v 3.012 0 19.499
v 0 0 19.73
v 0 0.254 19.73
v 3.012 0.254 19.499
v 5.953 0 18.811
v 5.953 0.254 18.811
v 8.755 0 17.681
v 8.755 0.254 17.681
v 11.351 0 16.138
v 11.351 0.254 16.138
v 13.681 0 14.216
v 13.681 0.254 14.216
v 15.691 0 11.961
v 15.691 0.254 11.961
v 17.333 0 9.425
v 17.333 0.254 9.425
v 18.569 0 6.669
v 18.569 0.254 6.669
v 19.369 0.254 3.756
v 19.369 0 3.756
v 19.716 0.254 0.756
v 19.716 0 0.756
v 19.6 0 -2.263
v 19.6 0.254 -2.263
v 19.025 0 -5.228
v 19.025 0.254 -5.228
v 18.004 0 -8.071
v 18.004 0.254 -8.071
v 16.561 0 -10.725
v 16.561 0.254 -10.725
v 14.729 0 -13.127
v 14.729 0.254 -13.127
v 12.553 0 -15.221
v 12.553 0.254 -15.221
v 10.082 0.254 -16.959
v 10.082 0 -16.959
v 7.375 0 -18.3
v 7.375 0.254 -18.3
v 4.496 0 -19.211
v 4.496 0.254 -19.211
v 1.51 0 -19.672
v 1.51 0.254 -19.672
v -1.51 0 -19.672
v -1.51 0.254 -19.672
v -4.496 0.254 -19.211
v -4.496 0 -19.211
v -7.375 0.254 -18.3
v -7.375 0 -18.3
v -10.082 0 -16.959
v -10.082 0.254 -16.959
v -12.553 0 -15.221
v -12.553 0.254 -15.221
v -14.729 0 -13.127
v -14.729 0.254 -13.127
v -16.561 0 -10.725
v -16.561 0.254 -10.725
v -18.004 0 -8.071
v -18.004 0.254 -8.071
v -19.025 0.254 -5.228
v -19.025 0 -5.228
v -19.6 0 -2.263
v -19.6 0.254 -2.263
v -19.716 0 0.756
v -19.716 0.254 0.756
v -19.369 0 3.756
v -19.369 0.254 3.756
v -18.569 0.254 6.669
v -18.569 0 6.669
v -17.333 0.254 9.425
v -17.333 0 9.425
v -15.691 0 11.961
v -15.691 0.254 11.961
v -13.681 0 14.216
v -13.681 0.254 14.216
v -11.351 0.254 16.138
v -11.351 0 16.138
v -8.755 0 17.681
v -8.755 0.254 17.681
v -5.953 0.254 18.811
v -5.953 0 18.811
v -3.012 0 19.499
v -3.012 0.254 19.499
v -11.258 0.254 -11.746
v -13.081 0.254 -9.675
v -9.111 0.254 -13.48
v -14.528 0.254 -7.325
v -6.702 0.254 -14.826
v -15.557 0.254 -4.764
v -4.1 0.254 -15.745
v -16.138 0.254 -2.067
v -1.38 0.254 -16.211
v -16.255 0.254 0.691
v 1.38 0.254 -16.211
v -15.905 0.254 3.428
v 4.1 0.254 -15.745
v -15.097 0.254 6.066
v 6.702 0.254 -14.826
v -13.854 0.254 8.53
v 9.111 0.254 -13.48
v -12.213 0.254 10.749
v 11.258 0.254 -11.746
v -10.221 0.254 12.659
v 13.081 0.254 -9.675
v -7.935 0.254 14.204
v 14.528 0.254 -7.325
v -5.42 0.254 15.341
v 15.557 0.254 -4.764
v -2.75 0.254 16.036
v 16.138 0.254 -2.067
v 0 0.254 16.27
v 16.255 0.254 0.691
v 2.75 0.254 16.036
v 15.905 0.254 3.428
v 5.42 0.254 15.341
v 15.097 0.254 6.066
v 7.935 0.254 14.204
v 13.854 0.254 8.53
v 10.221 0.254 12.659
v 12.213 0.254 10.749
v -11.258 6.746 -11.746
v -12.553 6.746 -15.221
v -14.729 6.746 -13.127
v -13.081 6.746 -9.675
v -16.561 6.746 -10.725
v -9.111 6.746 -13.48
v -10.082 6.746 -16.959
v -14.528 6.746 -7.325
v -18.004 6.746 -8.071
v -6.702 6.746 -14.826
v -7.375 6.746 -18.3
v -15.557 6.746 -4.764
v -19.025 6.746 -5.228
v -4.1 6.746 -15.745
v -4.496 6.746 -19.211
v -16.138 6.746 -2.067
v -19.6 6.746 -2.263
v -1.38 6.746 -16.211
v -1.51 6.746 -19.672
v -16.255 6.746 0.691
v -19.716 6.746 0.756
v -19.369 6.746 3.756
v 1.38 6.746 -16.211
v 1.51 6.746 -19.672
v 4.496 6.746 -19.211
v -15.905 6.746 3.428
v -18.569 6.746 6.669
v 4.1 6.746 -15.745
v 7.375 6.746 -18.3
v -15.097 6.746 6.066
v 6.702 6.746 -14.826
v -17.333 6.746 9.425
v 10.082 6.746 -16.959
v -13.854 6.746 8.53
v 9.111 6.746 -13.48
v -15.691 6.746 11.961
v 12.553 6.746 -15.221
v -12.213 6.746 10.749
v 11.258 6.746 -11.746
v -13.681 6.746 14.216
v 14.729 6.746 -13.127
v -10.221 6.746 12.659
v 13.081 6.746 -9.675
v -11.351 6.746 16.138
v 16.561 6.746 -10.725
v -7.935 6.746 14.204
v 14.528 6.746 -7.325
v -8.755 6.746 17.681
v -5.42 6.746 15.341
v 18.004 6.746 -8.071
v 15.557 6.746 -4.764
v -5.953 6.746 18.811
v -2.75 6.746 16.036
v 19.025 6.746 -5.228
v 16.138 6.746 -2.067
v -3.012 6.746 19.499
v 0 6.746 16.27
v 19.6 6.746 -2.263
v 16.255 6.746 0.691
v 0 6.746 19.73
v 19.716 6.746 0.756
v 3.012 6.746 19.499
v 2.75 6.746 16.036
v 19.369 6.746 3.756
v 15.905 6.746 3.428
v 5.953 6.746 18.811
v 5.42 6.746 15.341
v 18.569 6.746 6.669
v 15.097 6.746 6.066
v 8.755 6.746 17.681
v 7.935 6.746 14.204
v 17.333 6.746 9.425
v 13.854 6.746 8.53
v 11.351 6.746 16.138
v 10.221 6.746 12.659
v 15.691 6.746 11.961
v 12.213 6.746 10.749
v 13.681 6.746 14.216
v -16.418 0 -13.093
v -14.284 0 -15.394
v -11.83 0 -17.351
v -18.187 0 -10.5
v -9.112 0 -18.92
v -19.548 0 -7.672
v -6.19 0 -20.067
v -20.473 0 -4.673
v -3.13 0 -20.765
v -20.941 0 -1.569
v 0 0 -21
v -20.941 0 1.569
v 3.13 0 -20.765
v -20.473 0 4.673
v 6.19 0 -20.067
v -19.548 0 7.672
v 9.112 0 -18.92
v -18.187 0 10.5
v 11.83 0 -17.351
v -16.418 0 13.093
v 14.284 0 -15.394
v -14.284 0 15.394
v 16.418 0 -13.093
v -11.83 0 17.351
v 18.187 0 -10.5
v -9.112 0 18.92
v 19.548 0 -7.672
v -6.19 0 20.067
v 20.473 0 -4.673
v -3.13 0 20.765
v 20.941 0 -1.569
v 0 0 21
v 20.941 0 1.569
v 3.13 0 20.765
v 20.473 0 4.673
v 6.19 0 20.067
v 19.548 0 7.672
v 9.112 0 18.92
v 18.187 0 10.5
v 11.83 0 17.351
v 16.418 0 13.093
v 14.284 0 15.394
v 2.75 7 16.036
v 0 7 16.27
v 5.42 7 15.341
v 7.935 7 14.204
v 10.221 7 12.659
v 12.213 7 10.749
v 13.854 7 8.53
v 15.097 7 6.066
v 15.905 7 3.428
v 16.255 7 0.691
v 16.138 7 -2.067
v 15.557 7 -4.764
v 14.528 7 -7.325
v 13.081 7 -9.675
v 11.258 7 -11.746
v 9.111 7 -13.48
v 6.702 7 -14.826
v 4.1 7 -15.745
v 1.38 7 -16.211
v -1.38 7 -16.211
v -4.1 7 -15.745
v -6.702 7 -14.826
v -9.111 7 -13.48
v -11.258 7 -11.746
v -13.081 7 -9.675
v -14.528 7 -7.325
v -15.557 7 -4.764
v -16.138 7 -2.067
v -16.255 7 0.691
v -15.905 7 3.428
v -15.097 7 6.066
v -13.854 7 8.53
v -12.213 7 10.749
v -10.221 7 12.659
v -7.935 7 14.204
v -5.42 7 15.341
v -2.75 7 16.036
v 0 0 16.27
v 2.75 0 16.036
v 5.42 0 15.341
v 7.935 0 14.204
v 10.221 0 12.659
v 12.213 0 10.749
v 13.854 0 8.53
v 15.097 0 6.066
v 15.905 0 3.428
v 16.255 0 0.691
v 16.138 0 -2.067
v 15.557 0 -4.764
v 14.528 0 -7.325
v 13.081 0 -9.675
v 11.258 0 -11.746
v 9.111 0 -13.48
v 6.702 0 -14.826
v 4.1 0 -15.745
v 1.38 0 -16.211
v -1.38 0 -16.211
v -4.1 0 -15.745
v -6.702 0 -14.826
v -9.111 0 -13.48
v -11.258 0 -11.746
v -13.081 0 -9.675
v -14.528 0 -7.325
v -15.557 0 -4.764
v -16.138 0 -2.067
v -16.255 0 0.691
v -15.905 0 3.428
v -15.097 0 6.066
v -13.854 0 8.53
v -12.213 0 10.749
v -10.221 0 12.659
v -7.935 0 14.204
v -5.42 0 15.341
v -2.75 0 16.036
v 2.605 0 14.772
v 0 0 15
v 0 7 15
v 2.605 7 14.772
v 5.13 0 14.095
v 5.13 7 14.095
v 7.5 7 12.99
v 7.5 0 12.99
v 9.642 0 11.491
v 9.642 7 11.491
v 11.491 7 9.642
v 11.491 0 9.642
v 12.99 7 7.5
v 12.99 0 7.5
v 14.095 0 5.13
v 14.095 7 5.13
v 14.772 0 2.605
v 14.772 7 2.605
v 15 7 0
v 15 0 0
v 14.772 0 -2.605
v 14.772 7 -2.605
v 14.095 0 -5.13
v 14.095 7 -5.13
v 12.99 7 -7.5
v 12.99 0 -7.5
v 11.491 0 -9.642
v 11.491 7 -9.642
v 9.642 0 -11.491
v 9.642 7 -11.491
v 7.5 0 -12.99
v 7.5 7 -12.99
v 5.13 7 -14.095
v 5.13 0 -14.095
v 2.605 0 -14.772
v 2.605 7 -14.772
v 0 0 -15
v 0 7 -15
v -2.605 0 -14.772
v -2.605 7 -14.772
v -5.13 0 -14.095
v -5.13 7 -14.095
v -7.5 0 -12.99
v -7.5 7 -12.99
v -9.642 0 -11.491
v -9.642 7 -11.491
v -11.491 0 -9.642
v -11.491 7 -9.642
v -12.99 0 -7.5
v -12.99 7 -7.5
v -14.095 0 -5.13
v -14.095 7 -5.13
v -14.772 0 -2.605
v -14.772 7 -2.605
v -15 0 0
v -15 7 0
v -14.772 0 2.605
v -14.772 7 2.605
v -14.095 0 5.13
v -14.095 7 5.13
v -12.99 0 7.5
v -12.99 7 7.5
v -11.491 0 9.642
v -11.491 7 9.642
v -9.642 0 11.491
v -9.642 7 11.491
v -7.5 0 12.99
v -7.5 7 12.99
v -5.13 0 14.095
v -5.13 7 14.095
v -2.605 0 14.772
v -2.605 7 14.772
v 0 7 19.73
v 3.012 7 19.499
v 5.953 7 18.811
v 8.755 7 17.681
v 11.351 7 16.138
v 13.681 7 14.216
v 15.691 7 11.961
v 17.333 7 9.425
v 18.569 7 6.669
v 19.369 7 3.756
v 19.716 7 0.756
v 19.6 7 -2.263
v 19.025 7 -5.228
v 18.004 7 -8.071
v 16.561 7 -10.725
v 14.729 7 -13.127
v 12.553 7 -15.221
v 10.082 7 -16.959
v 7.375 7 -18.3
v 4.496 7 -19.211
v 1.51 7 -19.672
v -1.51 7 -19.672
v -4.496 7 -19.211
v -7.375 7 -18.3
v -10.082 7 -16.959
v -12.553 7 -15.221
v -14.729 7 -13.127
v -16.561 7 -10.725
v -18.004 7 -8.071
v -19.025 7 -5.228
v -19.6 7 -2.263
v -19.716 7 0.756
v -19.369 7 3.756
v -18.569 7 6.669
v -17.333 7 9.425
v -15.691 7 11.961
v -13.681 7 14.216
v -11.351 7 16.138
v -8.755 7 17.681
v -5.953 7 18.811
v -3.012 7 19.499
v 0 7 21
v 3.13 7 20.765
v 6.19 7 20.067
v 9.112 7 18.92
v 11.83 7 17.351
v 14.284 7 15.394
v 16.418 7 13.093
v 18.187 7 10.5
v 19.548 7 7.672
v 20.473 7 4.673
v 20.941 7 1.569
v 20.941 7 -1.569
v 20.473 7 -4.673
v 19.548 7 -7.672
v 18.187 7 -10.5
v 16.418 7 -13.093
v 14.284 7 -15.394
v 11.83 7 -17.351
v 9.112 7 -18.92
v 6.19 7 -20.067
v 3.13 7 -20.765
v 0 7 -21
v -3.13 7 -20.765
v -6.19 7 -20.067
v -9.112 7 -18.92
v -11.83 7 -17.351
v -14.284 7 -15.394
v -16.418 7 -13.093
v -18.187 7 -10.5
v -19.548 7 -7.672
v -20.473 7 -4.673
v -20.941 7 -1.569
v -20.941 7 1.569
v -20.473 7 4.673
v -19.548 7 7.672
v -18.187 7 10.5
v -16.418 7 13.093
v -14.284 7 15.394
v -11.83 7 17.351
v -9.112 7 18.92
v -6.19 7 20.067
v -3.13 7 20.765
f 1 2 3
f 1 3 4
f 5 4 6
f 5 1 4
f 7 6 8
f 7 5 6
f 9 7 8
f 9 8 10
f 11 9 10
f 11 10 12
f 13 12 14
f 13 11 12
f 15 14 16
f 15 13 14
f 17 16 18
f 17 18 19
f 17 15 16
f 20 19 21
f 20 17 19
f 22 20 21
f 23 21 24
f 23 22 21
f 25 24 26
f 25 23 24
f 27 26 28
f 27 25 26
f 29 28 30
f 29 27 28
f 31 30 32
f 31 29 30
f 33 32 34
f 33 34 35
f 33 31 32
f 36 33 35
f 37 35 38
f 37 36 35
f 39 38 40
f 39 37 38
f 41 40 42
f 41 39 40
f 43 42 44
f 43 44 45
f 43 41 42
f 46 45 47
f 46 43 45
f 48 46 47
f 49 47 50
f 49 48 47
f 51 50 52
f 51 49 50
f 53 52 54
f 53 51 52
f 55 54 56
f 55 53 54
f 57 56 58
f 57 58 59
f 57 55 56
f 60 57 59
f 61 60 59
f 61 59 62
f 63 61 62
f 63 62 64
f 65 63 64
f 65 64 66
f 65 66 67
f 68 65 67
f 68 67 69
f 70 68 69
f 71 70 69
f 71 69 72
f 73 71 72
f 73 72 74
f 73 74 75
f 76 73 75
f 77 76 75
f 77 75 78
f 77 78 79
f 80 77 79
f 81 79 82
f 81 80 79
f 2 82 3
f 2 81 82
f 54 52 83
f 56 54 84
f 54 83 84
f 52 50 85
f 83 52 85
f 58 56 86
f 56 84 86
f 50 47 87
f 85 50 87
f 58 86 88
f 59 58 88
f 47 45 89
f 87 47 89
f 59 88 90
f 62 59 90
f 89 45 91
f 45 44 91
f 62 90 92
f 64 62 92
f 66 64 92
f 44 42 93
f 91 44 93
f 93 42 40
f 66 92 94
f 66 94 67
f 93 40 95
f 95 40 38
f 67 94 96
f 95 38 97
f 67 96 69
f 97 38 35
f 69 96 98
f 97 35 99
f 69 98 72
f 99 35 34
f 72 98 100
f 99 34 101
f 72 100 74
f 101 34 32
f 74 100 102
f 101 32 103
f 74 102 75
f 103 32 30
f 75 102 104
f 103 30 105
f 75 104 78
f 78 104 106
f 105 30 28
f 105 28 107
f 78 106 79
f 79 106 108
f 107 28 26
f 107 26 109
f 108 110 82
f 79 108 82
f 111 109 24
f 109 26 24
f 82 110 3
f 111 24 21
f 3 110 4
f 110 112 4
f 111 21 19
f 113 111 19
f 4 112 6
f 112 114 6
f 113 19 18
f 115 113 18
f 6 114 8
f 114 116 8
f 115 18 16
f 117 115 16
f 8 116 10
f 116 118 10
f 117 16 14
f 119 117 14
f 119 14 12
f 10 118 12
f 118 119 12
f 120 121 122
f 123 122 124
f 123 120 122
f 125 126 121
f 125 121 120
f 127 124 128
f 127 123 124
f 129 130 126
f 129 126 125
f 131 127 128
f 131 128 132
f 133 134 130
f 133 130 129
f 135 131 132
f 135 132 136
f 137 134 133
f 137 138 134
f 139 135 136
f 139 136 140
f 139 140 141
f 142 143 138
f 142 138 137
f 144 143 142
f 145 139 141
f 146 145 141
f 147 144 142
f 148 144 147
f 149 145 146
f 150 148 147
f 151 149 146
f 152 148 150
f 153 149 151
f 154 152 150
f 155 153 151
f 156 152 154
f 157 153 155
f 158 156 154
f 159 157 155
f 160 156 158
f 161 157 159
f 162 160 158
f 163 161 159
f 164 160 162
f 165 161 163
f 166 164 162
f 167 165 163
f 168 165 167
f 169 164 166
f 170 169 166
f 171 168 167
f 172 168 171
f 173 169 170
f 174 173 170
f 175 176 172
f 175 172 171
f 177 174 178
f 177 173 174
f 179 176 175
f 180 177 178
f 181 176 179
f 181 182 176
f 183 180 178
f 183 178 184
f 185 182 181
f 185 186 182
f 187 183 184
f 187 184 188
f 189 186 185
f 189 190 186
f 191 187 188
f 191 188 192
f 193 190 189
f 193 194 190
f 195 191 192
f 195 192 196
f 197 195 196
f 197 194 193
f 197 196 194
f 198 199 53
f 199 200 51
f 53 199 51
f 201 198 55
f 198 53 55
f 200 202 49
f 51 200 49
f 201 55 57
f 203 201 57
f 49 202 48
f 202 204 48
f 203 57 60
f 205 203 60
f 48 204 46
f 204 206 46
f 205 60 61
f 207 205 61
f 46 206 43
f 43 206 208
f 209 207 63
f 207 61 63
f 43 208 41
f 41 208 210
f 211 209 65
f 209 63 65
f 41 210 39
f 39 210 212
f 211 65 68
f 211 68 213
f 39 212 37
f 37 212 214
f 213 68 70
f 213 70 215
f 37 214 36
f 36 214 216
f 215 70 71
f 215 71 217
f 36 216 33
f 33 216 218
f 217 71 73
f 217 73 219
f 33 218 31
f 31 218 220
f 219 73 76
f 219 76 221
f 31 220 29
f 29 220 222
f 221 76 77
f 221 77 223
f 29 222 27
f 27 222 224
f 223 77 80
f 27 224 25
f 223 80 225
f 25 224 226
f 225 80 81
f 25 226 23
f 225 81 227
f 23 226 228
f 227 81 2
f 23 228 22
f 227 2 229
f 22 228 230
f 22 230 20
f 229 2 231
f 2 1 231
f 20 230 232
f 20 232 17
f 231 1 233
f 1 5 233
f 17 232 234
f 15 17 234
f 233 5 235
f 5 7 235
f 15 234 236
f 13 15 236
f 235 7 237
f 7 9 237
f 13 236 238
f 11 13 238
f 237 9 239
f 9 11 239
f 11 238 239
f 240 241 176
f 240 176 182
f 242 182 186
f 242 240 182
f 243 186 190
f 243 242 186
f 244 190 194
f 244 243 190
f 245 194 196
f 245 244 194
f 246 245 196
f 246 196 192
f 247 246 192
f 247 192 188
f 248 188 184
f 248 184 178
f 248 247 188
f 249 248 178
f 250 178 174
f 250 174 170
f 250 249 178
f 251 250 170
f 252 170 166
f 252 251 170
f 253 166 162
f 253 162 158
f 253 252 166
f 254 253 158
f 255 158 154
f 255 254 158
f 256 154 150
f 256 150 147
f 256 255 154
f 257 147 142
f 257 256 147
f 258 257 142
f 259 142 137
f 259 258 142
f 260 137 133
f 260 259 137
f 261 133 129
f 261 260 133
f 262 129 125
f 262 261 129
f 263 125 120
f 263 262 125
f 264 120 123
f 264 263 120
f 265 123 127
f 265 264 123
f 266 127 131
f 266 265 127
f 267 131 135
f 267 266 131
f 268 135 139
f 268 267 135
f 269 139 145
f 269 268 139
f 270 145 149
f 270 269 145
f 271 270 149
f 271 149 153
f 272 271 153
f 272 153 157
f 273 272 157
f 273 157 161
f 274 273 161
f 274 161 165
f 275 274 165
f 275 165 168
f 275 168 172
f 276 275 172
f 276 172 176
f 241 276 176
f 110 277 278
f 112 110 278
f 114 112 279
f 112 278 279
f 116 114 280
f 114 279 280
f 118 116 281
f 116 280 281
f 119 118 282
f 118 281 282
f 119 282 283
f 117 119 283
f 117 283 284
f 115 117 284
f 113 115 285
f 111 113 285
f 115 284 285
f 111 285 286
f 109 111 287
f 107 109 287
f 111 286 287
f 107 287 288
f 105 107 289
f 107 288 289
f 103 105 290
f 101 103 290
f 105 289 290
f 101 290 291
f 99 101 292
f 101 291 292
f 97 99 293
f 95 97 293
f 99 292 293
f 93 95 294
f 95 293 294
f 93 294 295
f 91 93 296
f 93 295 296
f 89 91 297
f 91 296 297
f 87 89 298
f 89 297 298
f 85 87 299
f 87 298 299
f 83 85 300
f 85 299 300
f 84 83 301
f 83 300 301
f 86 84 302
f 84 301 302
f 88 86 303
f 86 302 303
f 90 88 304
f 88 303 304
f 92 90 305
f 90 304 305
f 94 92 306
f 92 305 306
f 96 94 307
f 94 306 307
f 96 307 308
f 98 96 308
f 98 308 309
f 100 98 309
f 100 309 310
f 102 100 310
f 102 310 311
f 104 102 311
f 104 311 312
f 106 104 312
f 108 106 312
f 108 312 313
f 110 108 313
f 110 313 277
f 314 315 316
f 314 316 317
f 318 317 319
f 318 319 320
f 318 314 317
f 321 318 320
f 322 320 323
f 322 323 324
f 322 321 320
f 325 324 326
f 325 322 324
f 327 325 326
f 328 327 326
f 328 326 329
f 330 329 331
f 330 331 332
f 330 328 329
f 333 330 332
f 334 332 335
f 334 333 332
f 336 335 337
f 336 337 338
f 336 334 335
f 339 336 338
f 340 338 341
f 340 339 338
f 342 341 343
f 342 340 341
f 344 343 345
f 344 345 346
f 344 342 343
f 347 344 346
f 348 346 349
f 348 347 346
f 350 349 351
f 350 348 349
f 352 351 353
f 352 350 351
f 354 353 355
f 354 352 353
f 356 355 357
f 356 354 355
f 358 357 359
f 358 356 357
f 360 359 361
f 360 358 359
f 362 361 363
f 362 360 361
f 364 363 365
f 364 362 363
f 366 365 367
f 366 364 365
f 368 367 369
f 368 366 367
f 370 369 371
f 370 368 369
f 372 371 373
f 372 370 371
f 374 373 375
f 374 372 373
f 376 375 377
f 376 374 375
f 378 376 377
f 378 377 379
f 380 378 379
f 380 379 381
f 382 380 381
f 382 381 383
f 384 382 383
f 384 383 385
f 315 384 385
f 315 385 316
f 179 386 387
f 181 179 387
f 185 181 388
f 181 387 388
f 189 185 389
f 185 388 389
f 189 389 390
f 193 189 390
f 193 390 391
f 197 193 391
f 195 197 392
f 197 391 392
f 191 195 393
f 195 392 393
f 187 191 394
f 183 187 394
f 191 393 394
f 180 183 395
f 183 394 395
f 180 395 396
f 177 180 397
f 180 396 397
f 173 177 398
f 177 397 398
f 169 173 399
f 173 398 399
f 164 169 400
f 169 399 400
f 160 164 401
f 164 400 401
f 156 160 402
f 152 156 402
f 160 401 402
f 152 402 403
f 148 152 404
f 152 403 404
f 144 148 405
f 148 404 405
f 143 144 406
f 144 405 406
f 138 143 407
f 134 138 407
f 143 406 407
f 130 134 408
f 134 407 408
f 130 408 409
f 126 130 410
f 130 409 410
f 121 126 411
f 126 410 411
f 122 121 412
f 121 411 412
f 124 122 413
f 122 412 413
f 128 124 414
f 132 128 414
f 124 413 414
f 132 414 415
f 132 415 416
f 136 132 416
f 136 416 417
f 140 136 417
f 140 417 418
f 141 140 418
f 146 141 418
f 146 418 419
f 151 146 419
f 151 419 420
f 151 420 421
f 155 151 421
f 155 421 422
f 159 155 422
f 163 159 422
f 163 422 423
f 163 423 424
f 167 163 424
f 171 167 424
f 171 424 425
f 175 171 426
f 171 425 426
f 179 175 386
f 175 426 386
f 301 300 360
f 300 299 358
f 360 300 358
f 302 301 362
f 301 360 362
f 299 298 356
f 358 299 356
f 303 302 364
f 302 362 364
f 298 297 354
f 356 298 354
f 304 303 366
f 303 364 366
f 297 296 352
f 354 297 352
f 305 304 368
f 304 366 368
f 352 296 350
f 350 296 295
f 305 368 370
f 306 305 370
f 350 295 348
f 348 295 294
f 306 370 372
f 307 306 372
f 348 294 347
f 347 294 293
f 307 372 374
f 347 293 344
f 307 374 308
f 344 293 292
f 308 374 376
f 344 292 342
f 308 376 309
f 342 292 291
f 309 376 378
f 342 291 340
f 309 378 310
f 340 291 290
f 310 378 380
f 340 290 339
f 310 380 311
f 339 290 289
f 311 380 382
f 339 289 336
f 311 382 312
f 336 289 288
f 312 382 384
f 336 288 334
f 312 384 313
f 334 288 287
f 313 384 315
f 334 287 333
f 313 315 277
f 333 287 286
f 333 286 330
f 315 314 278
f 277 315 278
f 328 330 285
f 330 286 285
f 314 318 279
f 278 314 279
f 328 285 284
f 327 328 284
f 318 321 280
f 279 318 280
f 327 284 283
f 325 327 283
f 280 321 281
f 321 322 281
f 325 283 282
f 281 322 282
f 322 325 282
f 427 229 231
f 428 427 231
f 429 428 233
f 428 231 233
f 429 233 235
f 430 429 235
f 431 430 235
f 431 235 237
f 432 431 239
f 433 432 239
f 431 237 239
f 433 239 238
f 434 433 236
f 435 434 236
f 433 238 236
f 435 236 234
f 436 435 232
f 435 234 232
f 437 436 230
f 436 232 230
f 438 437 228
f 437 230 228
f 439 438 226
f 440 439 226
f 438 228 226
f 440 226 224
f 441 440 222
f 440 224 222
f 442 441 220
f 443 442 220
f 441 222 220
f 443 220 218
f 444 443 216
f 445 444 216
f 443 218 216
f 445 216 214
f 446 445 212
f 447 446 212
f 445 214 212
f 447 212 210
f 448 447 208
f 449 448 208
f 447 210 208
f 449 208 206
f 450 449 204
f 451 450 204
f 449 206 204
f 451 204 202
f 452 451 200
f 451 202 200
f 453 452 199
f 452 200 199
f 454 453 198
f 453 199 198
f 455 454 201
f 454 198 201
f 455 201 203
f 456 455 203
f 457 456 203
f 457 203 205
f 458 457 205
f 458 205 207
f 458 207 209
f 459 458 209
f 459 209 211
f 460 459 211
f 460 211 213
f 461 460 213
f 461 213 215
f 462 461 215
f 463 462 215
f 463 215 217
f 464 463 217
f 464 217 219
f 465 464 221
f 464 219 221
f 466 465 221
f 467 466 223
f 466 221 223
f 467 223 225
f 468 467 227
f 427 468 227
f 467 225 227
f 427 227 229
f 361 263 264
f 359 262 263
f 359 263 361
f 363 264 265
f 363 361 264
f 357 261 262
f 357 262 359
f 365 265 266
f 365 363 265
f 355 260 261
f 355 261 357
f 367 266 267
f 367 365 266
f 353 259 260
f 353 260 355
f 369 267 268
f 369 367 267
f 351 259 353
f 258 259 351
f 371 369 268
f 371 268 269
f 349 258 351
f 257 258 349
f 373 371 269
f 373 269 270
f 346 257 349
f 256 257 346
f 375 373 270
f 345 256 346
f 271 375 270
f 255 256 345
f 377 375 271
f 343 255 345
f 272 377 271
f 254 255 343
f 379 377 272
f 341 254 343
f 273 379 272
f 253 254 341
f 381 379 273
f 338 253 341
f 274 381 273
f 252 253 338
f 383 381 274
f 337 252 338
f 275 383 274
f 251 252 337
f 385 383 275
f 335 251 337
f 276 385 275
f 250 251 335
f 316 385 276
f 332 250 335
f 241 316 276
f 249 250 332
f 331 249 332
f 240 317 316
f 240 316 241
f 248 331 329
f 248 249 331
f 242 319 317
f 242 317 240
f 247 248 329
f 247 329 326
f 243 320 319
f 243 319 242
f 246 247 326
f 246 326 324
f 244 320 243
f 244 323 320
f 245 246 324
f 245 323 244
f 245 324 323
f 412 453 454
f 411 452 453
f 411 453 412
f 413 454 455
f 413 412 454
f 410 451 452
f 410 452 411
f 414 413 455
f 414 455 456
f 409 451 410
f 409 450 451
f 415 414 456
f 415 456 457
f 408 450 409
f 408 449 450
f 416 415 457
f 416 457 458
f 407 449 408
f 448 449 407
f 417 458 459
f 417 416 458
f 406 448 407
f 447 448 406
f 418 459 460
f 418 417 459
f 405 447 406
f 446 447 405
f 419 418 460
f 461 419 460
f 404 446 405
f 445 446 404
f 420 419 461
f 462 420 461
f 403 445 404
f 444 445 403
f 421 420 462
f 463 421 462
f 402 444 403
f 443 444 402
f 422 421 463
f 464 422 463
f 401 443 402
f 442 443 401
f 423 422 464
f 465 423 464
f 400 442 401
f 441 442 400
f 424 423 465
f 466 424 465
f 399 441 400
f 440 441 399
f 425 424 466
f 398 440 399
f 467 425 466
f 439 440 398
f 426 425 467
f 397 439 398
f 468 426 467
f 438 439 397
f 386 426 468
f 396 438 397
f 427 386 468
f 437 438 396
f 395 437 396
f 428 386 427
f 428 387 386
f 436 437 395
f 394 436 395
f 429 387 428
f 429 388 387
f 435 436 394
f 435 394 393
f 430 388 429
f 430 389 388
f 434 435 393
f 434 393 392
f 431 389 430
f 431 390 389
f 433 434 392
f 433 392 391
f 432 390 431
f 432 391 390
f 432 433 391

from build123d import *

# Parameters (mm, degrees)
SKETCH1_R           = 21
SKETCH1_R_2         = 15
BOSS_EXTRUDE1_DEPTH = 7
SKETCH2_R           = 19.73
SKETCH2_R_2         = 16.27
CUT_EXTRUDE1_DEPTH  = 0.254


with BuildPart() as part:
    # Sketch1 → Boss-Extrude1 (new body)
    with BuildSketch(Plane(origin=(0, 0, 0), x_dir=(1, 0, 0), z_dir=(0, 1, 0))):
        with Locations(Location((0, 0, 0), (0, 0, 270))):
            Circle(SKETCH1_R)
        with Locations(Location((0, 0, 0), (0, 0, 270))):
            Circle(SKETCH1_R_2, mode=Mode.SUBTRACT)
    extrude(amount=BOSS_EXTRUDE1_DEPTH)

    # Sketch2 → Cut-Extrude1 (cut)
    with BuildSketch(Plane(origin=(0, 7, 0), x_dir=(1, 0, 0), z_dir=(0, 1, 0))):
        with Locations(Location((0, 0, 0), (0, 0, 270))):
            Circle(SKETCH2_R)
        with Locations(Location((0, 0, 0), (0, 0, 270))):
            Circle(SKETCH2_R_2, mode=Mode.SUBTRACT)
    cut_extrude1 = extrude(amount=-CUT_EXTRUDE1_DEPTH, mode=Mode.SUBTRACT)

    # Mirror1: Cut-Extrude1 across plane
    add(cut_extrude1.mirror(Plane(origin=(0, 3.5, 0), x_dir=(0, 0, 1), z_dir=(0, -1, 0))), mode=Mode.SUBTRACT)


solid = part.part
